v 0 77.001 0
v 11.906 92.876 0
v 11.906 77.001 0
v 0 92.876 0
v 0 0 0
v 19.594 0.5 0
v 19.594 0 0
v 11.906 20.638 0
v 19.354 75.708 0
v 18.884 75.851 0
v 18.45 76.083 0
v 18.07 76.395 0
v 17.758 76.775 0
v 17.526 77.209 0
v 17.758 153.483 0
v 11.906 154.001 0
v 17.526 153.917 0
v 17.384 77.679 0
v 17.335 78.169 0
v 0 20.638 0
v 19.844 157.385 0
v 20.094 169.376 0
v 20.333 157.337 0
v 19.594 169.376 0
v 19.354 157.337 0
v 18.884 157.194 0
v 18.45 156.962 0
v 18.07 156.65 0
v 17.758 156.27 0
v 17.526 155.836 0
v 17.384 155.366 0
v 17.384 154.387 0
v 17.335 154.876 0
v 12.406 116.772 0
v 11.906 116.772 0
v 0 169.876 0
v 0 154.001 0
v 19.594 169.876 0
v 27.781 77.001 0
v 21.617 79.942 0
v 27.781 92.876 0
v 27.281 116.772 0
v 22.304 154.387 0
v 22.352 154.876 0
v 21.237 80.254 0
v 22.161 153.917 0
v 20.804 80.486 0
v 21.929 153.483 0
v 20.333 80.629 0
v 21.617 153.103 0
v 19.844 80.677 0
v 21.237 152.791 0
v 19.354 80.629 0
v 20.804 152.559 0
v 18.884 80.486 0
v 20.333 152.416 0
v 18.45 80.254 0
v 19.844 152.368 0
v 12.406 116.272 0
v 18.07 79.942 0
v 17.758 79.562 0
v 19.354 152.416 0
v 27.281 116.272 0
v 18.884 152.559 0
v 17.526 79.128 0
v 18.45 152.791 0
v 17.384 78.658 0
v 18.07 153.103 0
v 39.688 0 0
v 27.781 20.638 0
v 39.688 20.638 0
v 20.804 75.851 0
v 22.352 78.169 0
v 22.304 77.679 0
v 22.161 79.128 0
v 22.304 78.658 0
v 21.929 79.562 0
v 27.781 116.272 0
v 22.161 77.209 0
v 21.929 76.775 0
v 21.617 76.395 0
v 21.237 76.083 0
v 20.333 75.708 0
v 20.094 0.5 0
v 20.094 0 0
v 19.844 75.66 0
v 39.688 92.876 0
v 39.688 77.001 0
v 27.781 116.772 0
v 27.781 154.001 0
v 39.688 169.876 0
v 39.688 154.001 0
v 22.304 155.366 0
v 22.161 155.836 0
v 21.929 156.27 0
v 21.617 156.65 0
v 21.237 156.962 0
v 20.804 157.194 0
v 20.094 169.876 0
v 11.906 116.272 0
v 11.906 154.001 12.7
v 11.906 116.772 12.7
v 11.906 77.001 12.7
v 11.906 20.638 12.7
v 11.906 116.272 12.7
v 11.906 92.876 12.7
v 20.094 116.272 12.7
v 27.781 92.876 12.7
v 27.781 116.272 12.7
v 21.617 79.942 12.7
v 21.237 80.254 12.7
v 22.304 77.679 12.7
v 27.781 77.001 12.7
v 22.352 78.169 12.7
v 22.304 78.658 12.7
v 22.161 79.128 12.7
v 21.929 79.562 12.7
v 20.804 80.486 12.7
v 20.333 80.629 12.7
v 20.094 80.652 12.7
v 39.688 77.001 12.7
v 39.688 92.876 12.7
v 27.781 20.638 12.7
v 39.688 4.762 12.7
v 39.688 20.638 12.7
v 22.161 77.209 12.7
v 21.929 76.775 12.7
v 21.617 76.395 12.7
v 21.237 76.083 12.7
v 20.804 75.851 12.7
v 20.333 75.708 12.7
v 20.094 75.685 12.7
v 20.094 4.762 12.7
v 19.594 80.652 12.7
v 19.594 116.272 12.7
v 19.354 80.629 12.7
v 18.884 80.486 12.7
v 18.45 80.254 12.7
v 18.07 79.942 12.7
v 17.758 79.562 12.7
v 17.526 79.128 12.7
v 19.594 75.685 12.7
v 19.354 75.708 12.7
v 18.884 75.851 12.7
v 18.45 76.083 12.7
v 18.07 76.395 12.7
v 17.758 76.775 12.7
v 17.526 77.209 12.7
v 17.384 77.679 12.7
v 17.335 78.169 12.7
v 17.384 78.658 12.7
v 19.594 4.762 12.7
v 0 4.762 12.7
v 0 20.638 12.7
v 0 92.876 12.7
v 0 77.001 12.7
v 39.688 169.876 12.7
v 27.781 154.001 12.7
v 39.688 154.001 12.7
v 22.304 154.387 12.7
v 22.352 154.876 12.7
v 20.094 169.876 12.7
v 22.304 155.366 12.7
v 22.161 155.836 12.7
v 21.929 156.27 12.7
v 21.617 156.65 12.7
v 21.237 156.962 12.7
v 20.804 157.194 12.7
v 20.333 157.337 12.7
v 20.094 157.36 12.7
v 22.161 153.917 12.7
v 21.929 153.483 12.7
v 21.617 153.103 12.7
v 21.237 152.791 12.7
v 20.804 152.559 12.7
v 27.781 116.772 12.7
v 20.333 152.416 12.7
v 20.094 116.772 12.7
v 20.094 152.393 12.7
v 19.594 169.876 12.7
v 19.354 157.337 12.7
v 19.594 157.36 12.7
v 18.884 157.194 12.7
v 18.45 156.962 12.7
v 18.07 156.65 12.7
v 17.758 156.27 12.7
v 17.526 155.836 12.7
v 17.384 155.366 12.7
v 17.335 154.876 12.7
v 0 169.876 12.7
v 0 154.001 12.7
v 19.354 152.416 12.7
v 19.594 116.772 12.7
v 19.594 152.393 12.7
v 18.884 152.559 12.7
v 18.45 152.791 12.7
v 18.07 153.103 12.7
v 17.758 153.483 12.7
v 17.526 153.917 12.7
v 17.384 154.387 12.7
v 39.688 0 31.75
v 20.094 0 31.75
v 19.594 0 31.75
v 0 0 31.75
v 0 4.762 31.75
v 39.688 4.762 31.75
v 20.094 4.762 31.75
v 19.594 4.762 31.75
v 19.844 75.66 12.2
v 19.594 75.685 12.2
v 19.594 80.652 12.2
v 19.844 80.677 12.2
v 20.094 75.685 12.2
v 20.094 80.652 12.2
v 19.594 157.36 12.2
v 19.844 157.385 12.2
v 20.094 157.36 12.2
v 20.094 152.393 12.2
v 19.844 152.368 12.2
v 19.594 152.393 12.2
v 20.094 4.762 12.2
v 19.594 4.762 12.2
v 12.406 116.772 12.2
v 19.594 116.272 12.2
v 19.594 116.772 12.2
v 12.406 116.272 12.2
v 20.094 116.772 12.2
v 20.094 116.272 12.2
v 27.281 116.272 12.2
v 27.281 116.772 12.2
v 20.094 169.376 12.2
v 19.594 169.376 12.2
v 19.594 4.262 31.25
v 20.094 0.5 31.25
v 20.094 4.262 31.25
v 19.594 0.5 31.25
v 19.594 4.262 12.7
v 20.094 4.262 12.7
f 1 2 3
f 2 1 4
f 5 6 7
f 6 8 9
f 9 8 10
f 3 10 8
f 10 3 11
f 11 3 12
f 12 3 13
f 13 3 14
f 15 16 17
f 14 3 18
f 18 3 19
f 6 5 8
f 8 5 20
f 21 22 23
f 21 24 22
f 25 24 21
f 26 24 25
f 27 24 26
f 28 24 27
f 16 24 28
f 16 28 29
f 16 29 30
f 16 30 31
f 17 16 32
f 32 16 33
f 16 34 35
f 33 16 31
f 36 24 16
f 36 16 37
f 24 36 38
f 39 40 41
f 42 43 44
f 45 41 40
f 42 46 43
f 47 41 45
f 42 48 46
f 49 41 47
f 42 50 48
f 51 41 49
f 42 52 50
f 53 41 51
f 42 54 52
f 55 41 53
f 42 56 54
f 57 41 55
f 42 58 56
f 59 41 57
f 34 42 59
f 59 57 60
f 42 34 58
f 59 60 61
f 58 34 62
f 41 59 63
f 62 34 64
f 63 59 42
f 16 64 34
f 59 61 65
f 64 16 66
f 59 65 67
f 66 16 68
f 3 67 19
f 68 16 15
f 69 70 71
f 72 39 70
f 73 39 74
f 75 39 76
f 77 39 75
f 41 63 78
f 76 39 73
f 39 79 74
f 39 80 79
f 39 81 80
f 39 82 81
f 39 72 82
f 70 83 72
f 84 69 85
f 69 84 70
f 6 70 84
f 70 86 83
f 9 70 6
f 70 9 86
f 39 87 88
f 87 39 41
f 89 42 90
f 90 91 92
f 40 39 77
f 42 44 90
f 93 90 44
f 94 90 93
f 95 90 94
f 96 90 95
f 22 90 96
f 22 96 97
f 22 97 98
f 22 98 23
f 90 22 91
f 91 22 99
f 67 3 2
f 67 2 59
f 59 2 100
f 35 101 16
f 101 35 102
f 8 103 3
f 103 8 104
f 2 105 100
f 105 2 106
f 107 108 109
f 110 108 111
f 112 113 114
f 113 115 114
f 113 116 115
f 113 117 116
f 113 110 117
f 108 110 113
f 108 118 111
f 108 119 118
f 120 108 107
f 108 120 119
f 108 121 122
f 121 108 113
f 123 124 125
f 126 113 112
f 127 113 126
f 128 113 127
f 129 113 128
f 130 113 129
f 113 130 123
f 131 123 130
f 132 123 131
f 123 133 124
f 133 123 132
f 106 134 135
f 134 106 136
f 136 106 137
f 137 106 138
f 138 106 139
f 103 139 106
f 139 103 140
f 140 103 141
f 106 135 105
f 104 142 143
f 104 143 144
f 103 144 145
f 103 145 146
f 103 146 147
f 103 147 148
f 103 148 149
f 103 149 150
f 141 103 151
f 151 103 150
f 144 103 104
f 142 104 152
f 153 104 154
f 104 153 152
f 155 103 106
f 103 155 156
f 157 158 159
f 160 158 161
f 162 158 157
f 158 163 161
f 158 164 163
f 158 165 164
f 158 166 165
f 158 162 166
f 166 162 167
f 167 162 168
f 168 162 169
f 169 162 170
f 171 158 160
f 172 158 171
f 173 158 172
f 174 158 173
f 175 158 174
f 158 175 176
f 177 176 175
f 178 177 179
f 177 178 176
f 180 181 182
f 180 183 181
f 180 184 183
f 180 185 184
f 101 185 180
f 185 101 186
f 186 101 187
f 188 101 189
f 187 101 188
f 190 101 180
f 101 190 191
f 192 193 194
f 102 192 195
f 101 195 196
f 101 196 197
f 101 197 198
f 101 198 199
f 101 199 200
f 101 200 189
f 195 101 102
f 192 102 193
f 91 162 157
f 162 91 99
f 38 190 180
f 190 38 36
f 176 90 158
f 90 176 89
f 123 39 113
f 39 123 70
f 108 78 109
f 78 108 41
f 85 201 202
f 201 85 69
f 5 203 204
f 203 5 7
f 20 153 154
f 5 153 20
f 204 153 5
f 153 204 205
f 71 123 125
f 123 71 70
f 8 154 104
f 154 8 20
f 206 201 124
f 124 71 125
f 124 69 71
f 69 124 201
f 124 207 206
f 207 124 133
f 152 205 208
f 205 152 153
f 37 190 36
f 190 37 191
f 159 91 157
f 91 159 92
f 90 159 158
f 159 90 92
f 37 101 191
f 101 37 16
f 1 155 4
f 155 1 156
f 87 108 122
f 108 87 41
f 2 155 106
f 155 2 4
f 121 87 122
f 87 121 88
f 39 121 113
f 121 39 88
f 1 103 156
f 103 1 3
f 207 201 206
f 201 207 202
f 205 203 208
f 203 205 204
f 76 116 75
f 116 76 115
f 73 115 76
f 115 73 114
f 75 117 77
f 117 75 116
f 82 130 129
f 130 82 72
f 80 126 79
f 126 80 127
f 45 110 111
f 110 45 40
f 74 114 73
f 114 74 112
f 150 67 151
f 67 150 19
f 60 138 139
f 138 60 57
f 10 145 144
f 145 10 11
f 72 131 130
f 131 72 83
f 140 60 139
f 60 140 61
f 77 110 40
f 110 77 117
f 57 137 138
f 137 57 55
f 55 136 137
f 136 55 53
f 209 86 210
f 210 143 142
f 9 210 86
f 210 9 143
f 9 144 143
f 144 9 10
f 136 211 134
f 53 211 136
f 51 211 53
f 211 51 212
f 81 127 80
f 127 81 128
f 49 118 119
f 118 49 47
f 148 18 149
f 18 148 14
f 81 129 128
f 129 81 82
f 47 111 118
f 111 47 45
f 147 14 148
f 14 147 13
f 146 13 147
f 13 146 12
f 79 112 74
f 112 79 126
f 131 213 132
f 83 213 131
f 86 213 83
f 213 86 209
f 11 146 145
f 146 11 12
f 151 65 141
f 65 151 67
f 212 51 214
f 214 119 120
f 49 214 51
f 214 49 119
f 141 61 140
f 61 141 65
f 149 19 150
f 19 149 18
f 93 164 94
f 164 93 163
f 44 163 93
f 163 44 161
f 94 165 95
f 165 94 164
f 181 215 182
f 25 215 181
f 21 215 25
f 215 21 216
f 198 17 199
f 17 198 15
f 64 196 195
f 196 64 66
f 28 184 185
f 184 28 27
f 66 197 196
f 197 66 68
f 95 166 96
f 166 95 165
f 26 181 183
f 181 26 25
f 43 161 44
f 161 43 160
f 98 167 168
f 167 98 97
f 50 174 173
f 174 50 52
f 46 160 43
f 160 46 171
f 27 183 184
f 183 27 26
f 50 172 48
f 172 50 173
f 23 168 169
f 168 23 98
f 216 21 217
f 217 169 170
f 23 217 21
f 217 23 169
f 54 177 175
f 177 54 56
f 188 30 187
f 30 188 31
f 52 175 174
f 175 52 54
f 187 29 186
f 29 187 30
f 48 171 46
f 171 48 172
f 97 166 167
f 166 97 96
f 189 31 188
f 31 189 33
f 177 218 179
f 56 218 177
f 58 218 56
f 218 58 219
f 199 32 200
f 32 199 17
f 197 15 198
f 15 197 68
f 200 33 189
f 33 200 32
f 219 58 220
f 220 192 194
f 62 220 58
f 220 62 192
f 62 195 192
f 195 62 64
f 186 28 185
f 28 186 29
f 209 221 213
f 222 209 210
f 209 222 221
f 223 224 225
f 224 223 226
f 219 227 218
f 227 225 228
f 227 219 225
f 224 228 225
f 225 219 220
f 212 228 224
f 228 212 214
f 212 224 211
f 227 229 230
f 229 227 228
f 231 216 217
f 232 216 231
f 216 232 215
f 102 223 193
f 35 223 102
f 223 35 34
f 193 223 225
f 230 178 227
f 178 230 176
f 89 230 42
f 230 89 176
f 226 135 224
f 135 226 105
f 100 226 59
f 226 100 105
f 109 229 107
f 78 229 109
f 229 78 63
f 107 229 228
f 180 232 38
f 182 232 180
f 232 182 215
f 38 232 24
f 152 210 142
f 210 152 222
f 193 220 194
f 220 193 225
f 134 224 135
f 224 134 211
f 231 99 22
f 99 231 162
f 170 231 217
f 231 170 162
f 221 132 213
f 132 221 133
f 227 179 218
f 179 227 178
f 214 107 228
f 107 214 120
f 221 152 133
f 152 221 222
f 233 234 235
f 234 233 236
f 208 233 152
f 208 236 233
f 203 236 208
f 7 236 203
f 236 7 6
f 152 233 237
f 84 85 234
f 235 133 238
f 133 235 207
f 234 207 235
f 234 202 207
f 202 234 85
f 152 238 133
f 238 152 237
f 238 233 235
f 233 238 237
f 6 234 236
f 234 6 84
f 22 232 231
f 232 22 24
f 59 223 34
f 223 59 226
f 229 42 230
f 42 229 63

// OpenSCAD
//Changelog:
//V1.1 Added centerlines where missing on the sides. 8/14/17

$fa=6*1;
$fs=0.5*1;

// Stile Width (in inches)
x_in=1.5625;

// Bottom Hole (in inches)
y_in=2.89; //2.875

// Plate Thickness (in inches)
z_in=0.5;

// Lip Thickness (in inches)
lip_in=0.1875;

// Hole Diameter (in inches)
d_in=0.1975; //0.1975 fits 3/16" drill bit well

// Center to Center in inches
CTC_in=3.02;

// Width of center rail
a_in=0.625;

mm_per_inch=25.4*1;
x_mm = x_in*mm_per_inch; 
y_mm = y_in*mm_per_inch; 
z_mm = z_in*mm_per_inch; 
lip_mm = lip_in*mm_per_inch; 
d_mm = d_in*mm_per_inch; 
CTC_mm = CTC_in*mm_per_inch; 
a_mm = a_in*mm_per_inch;
//total_height=(CTC+1+z_in)*mm_per_inch;
difference()
{
    union() {
    
    // build center rail
    linear_extrude(z_mm) 
    translate([(x_mm/2)-(a_mm/2),0,0])   
    square([a_mm, (lip_mm+y_mm+CTC_mm+15)]);    
    
    // build crossbeams
    linear_extrude(z_mm) 
    translate([0,lip_mm,0])   
    square([x_mm, a_mm]);
        
    linear_extrude(z_mm) 
    translate([0,lip_mm+y_mm+CTC_mm+15-a_mm,0])   
    square([x_mm, a_mm]);
        
    linear_extrude(z_mm) 
    translate([0,((lip_mm+y_mm+CTC_mm+15)/2)-(a_mm/2),0])   
    square([x_mm, a_mm]);    
        
    // build main plate
    //linear_extrude(z_mm) 
    //square([x_mm, (lip_mm+y_mm+CTC_mm+15)]);

    // build lip
    //translate([0,0,z_mm]) 
    linear_extrude((0.75*mm_per_inch)+z_mm) 
    square([x_mm, (lip_mm)]);
    }

    // Drill bottom hole
    translate ([(x_mm/2), (lip_mm+y_mm), 0])
    cylinder(h=z_mm*4, d=d_mm, center=true);


    // Drill top hole
    translate ([(x_mm/2), (lip_mm+y_mm+CTC_mm), 0])
    cylinder(h=z_mm*4, d=d_mm, center=true);
    
    // Draw Centerline Mark #1
    translate ([0, lip_mm+y_mm+(CTC_mm/2)-(0.5/2), z_mm-0.5])
    linear_extrude(0.5)
    square([x_mm, 0.5]);

    // Draw Centerline Mark #2
    translate ([(x_mm/2)-(0.5/2), lip_mm, z_mm-0.5])
    linear_extrude(0.5)
    square([0.5,(y_mm+CTC_mm+15)]);
    
    // Draw Centerline Mark #3
    translate ([(x_mm/2)-(0.5/2), 0, (0.75*mm_per_inch)+z_mm-0.5])
    linear_extrude(0.5)
    square([0.5,(lip_mm)]);
    
    // Draw Centerline Mark #4
    translate ([(x_mm/2)-(0.5/2), lip_mm-0.5, z_mm])
    linear_extrude((0.75*mm_per_inch))
    square([0.5,0.5]);
    
    // Draw Centerline Mark #5
    translate ([(x_mm/2)-(0.5/2), 0, 0])
    linear_extrude(z_mm+(0.75*mm_per_inch))
    square([0.5,0.5]);
    
    // Draw Centerline Mark #6
    translate ([(x_mm/2)-(0.5/2), lip_mm+y_mm+CTC_mm+15-0.5, 0])
    linear_extrude(z_mm)
    square([0.5,0.5]);
    
    // Draw Centerline Mark #7 Horizontal Left Side
    translate ([(x_mm/2)-(a_mm/2), lip_mm+y_mm+(CTC_mm/2)-(0.5/2), 0])
    linear_extrude(z_mm)
    square([0.5,0.5]);
    
    // Draw Centerline Mark #8 Horizontal Right Side
    translate ([(x_mm/2)+(a_mm/2)-0.5, lip_mm+y_mm+(CTC_mm/2)-(0.5/2), 0])
    linear_extrude(z_mm)
    square([0.5,0.5]);
}
